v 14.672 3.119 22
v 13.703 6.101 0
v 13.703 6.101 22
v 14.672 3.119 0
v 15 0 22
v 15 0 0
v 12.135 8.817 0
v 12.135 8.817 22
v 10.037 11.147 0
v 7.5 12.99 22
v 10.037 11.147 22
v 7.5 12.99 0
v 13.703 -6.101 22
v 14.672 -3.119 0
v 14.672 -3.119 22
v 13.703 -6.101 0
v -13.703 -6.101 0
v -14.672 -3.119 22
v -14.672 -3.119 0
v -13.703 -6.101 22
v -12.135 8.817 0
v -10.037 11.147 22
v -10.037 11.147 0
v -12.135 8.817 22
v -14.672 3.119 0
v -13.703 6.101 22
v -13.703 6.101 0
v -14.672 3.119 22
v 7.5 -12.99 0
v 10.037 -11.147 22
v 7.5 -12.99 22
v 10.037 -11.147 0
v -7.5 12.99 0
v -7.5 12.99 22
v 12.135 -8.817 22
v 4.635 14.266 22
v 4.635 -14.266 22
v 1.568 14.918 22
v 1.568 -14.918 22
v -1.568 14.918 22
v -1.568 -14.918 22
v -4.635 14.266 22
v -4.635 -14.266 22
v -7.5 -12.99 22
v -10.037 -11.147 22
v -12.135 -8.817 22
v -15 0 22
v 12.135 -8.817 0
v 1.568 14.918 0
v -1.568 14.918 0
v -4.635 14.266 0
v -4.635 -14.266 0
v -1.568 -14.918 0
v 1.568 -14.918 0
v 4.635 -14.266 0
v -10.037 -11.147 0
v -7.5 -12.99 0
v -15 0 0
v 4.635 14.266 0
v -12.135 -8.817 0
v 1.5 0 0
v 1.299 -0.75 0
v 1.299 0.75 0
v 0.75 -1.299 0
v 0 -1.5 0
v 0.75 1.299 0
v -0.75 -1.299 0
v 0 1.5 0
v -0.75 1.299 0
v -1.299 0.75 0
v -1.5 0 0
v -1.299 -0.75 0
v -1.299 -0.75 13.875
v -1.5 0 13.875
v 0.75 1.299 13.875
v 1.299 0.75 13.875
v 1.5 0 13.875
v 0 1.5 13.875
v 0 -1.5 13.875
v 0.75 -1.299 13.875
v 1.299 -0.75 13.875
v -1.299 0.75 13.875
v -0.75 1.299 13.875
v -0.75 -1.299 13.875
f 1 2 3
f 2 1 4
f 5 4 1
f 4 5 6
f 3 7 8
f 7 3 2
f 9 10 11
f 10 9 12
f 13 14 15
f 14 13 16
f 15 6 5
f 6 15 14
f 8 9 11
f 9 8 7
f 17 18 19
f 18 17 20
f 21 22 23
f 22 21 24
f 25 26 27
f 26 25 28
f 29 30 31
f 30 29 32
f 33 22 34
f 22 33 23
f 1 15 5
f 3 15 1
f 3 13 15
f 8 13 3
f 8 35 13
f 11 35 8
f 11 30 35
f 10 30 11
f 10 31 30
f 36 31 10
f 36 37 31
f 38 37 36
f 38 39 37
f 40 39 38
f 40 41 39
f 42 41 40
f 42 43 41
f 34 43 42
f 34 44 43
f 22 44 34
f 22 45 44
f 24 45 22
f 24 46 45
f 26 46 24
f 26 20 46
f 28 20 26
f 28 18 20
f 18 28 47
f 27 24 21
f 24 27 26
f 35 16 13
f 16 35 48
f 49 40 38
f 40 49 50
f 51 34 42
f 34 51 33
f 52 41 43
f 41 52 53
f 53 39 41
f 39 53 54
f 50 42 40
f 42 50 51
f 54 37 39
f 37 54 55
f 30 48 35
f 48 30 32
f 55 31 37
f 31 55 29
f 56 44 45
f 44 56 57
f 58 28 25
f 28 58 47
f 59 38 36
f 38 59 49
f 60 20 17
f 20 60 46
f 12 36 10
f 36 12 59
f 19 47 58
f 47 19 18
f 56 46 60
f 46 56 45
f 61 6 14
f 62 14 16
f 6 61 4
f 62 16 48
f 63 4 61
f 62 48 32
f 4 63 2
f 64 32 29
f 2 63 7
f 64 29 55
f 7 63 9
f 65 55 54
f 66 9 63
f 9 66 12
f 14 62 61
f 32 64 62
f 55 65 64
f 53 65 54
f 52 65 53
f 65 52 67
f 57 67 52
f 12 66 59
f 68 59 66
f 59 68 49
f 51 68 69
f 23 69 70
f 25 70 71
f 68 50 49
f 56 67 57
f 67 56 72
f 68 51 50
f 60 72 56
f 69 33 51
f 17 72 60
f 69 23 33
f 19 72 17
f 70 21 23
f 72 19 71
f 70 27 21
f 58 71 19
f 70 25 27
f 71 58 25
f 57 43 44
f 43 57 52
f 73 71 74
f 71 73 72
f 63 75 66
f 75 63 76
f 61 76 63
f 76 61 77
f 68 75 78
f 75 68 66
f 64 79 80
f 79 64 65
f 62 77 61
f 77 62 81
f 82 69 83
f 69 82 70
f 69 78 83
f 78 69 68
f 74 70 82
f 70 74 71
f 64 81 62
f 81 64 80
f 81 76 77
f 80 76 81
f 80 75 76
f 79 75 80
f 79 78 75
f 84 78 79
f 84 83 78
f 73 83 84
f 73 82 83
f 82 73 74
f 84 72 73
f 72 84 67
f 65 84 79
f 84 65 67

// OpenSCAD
goldenratio = 1.61803399;
joinfactor = 0.125;

mounthole = 3/2;		// Sized to fit an M3 screw
mountholedepth = 14;

pullknob_simplecylinder();

module pullknob_simplecylinder()
{
	difference()
	{
		cylinder(r=15, h=22);

		translate([0,0,-joinfactor])
		cylinder(r=mounthole, h=mountholedepth, $fn=12); 
	}
}
